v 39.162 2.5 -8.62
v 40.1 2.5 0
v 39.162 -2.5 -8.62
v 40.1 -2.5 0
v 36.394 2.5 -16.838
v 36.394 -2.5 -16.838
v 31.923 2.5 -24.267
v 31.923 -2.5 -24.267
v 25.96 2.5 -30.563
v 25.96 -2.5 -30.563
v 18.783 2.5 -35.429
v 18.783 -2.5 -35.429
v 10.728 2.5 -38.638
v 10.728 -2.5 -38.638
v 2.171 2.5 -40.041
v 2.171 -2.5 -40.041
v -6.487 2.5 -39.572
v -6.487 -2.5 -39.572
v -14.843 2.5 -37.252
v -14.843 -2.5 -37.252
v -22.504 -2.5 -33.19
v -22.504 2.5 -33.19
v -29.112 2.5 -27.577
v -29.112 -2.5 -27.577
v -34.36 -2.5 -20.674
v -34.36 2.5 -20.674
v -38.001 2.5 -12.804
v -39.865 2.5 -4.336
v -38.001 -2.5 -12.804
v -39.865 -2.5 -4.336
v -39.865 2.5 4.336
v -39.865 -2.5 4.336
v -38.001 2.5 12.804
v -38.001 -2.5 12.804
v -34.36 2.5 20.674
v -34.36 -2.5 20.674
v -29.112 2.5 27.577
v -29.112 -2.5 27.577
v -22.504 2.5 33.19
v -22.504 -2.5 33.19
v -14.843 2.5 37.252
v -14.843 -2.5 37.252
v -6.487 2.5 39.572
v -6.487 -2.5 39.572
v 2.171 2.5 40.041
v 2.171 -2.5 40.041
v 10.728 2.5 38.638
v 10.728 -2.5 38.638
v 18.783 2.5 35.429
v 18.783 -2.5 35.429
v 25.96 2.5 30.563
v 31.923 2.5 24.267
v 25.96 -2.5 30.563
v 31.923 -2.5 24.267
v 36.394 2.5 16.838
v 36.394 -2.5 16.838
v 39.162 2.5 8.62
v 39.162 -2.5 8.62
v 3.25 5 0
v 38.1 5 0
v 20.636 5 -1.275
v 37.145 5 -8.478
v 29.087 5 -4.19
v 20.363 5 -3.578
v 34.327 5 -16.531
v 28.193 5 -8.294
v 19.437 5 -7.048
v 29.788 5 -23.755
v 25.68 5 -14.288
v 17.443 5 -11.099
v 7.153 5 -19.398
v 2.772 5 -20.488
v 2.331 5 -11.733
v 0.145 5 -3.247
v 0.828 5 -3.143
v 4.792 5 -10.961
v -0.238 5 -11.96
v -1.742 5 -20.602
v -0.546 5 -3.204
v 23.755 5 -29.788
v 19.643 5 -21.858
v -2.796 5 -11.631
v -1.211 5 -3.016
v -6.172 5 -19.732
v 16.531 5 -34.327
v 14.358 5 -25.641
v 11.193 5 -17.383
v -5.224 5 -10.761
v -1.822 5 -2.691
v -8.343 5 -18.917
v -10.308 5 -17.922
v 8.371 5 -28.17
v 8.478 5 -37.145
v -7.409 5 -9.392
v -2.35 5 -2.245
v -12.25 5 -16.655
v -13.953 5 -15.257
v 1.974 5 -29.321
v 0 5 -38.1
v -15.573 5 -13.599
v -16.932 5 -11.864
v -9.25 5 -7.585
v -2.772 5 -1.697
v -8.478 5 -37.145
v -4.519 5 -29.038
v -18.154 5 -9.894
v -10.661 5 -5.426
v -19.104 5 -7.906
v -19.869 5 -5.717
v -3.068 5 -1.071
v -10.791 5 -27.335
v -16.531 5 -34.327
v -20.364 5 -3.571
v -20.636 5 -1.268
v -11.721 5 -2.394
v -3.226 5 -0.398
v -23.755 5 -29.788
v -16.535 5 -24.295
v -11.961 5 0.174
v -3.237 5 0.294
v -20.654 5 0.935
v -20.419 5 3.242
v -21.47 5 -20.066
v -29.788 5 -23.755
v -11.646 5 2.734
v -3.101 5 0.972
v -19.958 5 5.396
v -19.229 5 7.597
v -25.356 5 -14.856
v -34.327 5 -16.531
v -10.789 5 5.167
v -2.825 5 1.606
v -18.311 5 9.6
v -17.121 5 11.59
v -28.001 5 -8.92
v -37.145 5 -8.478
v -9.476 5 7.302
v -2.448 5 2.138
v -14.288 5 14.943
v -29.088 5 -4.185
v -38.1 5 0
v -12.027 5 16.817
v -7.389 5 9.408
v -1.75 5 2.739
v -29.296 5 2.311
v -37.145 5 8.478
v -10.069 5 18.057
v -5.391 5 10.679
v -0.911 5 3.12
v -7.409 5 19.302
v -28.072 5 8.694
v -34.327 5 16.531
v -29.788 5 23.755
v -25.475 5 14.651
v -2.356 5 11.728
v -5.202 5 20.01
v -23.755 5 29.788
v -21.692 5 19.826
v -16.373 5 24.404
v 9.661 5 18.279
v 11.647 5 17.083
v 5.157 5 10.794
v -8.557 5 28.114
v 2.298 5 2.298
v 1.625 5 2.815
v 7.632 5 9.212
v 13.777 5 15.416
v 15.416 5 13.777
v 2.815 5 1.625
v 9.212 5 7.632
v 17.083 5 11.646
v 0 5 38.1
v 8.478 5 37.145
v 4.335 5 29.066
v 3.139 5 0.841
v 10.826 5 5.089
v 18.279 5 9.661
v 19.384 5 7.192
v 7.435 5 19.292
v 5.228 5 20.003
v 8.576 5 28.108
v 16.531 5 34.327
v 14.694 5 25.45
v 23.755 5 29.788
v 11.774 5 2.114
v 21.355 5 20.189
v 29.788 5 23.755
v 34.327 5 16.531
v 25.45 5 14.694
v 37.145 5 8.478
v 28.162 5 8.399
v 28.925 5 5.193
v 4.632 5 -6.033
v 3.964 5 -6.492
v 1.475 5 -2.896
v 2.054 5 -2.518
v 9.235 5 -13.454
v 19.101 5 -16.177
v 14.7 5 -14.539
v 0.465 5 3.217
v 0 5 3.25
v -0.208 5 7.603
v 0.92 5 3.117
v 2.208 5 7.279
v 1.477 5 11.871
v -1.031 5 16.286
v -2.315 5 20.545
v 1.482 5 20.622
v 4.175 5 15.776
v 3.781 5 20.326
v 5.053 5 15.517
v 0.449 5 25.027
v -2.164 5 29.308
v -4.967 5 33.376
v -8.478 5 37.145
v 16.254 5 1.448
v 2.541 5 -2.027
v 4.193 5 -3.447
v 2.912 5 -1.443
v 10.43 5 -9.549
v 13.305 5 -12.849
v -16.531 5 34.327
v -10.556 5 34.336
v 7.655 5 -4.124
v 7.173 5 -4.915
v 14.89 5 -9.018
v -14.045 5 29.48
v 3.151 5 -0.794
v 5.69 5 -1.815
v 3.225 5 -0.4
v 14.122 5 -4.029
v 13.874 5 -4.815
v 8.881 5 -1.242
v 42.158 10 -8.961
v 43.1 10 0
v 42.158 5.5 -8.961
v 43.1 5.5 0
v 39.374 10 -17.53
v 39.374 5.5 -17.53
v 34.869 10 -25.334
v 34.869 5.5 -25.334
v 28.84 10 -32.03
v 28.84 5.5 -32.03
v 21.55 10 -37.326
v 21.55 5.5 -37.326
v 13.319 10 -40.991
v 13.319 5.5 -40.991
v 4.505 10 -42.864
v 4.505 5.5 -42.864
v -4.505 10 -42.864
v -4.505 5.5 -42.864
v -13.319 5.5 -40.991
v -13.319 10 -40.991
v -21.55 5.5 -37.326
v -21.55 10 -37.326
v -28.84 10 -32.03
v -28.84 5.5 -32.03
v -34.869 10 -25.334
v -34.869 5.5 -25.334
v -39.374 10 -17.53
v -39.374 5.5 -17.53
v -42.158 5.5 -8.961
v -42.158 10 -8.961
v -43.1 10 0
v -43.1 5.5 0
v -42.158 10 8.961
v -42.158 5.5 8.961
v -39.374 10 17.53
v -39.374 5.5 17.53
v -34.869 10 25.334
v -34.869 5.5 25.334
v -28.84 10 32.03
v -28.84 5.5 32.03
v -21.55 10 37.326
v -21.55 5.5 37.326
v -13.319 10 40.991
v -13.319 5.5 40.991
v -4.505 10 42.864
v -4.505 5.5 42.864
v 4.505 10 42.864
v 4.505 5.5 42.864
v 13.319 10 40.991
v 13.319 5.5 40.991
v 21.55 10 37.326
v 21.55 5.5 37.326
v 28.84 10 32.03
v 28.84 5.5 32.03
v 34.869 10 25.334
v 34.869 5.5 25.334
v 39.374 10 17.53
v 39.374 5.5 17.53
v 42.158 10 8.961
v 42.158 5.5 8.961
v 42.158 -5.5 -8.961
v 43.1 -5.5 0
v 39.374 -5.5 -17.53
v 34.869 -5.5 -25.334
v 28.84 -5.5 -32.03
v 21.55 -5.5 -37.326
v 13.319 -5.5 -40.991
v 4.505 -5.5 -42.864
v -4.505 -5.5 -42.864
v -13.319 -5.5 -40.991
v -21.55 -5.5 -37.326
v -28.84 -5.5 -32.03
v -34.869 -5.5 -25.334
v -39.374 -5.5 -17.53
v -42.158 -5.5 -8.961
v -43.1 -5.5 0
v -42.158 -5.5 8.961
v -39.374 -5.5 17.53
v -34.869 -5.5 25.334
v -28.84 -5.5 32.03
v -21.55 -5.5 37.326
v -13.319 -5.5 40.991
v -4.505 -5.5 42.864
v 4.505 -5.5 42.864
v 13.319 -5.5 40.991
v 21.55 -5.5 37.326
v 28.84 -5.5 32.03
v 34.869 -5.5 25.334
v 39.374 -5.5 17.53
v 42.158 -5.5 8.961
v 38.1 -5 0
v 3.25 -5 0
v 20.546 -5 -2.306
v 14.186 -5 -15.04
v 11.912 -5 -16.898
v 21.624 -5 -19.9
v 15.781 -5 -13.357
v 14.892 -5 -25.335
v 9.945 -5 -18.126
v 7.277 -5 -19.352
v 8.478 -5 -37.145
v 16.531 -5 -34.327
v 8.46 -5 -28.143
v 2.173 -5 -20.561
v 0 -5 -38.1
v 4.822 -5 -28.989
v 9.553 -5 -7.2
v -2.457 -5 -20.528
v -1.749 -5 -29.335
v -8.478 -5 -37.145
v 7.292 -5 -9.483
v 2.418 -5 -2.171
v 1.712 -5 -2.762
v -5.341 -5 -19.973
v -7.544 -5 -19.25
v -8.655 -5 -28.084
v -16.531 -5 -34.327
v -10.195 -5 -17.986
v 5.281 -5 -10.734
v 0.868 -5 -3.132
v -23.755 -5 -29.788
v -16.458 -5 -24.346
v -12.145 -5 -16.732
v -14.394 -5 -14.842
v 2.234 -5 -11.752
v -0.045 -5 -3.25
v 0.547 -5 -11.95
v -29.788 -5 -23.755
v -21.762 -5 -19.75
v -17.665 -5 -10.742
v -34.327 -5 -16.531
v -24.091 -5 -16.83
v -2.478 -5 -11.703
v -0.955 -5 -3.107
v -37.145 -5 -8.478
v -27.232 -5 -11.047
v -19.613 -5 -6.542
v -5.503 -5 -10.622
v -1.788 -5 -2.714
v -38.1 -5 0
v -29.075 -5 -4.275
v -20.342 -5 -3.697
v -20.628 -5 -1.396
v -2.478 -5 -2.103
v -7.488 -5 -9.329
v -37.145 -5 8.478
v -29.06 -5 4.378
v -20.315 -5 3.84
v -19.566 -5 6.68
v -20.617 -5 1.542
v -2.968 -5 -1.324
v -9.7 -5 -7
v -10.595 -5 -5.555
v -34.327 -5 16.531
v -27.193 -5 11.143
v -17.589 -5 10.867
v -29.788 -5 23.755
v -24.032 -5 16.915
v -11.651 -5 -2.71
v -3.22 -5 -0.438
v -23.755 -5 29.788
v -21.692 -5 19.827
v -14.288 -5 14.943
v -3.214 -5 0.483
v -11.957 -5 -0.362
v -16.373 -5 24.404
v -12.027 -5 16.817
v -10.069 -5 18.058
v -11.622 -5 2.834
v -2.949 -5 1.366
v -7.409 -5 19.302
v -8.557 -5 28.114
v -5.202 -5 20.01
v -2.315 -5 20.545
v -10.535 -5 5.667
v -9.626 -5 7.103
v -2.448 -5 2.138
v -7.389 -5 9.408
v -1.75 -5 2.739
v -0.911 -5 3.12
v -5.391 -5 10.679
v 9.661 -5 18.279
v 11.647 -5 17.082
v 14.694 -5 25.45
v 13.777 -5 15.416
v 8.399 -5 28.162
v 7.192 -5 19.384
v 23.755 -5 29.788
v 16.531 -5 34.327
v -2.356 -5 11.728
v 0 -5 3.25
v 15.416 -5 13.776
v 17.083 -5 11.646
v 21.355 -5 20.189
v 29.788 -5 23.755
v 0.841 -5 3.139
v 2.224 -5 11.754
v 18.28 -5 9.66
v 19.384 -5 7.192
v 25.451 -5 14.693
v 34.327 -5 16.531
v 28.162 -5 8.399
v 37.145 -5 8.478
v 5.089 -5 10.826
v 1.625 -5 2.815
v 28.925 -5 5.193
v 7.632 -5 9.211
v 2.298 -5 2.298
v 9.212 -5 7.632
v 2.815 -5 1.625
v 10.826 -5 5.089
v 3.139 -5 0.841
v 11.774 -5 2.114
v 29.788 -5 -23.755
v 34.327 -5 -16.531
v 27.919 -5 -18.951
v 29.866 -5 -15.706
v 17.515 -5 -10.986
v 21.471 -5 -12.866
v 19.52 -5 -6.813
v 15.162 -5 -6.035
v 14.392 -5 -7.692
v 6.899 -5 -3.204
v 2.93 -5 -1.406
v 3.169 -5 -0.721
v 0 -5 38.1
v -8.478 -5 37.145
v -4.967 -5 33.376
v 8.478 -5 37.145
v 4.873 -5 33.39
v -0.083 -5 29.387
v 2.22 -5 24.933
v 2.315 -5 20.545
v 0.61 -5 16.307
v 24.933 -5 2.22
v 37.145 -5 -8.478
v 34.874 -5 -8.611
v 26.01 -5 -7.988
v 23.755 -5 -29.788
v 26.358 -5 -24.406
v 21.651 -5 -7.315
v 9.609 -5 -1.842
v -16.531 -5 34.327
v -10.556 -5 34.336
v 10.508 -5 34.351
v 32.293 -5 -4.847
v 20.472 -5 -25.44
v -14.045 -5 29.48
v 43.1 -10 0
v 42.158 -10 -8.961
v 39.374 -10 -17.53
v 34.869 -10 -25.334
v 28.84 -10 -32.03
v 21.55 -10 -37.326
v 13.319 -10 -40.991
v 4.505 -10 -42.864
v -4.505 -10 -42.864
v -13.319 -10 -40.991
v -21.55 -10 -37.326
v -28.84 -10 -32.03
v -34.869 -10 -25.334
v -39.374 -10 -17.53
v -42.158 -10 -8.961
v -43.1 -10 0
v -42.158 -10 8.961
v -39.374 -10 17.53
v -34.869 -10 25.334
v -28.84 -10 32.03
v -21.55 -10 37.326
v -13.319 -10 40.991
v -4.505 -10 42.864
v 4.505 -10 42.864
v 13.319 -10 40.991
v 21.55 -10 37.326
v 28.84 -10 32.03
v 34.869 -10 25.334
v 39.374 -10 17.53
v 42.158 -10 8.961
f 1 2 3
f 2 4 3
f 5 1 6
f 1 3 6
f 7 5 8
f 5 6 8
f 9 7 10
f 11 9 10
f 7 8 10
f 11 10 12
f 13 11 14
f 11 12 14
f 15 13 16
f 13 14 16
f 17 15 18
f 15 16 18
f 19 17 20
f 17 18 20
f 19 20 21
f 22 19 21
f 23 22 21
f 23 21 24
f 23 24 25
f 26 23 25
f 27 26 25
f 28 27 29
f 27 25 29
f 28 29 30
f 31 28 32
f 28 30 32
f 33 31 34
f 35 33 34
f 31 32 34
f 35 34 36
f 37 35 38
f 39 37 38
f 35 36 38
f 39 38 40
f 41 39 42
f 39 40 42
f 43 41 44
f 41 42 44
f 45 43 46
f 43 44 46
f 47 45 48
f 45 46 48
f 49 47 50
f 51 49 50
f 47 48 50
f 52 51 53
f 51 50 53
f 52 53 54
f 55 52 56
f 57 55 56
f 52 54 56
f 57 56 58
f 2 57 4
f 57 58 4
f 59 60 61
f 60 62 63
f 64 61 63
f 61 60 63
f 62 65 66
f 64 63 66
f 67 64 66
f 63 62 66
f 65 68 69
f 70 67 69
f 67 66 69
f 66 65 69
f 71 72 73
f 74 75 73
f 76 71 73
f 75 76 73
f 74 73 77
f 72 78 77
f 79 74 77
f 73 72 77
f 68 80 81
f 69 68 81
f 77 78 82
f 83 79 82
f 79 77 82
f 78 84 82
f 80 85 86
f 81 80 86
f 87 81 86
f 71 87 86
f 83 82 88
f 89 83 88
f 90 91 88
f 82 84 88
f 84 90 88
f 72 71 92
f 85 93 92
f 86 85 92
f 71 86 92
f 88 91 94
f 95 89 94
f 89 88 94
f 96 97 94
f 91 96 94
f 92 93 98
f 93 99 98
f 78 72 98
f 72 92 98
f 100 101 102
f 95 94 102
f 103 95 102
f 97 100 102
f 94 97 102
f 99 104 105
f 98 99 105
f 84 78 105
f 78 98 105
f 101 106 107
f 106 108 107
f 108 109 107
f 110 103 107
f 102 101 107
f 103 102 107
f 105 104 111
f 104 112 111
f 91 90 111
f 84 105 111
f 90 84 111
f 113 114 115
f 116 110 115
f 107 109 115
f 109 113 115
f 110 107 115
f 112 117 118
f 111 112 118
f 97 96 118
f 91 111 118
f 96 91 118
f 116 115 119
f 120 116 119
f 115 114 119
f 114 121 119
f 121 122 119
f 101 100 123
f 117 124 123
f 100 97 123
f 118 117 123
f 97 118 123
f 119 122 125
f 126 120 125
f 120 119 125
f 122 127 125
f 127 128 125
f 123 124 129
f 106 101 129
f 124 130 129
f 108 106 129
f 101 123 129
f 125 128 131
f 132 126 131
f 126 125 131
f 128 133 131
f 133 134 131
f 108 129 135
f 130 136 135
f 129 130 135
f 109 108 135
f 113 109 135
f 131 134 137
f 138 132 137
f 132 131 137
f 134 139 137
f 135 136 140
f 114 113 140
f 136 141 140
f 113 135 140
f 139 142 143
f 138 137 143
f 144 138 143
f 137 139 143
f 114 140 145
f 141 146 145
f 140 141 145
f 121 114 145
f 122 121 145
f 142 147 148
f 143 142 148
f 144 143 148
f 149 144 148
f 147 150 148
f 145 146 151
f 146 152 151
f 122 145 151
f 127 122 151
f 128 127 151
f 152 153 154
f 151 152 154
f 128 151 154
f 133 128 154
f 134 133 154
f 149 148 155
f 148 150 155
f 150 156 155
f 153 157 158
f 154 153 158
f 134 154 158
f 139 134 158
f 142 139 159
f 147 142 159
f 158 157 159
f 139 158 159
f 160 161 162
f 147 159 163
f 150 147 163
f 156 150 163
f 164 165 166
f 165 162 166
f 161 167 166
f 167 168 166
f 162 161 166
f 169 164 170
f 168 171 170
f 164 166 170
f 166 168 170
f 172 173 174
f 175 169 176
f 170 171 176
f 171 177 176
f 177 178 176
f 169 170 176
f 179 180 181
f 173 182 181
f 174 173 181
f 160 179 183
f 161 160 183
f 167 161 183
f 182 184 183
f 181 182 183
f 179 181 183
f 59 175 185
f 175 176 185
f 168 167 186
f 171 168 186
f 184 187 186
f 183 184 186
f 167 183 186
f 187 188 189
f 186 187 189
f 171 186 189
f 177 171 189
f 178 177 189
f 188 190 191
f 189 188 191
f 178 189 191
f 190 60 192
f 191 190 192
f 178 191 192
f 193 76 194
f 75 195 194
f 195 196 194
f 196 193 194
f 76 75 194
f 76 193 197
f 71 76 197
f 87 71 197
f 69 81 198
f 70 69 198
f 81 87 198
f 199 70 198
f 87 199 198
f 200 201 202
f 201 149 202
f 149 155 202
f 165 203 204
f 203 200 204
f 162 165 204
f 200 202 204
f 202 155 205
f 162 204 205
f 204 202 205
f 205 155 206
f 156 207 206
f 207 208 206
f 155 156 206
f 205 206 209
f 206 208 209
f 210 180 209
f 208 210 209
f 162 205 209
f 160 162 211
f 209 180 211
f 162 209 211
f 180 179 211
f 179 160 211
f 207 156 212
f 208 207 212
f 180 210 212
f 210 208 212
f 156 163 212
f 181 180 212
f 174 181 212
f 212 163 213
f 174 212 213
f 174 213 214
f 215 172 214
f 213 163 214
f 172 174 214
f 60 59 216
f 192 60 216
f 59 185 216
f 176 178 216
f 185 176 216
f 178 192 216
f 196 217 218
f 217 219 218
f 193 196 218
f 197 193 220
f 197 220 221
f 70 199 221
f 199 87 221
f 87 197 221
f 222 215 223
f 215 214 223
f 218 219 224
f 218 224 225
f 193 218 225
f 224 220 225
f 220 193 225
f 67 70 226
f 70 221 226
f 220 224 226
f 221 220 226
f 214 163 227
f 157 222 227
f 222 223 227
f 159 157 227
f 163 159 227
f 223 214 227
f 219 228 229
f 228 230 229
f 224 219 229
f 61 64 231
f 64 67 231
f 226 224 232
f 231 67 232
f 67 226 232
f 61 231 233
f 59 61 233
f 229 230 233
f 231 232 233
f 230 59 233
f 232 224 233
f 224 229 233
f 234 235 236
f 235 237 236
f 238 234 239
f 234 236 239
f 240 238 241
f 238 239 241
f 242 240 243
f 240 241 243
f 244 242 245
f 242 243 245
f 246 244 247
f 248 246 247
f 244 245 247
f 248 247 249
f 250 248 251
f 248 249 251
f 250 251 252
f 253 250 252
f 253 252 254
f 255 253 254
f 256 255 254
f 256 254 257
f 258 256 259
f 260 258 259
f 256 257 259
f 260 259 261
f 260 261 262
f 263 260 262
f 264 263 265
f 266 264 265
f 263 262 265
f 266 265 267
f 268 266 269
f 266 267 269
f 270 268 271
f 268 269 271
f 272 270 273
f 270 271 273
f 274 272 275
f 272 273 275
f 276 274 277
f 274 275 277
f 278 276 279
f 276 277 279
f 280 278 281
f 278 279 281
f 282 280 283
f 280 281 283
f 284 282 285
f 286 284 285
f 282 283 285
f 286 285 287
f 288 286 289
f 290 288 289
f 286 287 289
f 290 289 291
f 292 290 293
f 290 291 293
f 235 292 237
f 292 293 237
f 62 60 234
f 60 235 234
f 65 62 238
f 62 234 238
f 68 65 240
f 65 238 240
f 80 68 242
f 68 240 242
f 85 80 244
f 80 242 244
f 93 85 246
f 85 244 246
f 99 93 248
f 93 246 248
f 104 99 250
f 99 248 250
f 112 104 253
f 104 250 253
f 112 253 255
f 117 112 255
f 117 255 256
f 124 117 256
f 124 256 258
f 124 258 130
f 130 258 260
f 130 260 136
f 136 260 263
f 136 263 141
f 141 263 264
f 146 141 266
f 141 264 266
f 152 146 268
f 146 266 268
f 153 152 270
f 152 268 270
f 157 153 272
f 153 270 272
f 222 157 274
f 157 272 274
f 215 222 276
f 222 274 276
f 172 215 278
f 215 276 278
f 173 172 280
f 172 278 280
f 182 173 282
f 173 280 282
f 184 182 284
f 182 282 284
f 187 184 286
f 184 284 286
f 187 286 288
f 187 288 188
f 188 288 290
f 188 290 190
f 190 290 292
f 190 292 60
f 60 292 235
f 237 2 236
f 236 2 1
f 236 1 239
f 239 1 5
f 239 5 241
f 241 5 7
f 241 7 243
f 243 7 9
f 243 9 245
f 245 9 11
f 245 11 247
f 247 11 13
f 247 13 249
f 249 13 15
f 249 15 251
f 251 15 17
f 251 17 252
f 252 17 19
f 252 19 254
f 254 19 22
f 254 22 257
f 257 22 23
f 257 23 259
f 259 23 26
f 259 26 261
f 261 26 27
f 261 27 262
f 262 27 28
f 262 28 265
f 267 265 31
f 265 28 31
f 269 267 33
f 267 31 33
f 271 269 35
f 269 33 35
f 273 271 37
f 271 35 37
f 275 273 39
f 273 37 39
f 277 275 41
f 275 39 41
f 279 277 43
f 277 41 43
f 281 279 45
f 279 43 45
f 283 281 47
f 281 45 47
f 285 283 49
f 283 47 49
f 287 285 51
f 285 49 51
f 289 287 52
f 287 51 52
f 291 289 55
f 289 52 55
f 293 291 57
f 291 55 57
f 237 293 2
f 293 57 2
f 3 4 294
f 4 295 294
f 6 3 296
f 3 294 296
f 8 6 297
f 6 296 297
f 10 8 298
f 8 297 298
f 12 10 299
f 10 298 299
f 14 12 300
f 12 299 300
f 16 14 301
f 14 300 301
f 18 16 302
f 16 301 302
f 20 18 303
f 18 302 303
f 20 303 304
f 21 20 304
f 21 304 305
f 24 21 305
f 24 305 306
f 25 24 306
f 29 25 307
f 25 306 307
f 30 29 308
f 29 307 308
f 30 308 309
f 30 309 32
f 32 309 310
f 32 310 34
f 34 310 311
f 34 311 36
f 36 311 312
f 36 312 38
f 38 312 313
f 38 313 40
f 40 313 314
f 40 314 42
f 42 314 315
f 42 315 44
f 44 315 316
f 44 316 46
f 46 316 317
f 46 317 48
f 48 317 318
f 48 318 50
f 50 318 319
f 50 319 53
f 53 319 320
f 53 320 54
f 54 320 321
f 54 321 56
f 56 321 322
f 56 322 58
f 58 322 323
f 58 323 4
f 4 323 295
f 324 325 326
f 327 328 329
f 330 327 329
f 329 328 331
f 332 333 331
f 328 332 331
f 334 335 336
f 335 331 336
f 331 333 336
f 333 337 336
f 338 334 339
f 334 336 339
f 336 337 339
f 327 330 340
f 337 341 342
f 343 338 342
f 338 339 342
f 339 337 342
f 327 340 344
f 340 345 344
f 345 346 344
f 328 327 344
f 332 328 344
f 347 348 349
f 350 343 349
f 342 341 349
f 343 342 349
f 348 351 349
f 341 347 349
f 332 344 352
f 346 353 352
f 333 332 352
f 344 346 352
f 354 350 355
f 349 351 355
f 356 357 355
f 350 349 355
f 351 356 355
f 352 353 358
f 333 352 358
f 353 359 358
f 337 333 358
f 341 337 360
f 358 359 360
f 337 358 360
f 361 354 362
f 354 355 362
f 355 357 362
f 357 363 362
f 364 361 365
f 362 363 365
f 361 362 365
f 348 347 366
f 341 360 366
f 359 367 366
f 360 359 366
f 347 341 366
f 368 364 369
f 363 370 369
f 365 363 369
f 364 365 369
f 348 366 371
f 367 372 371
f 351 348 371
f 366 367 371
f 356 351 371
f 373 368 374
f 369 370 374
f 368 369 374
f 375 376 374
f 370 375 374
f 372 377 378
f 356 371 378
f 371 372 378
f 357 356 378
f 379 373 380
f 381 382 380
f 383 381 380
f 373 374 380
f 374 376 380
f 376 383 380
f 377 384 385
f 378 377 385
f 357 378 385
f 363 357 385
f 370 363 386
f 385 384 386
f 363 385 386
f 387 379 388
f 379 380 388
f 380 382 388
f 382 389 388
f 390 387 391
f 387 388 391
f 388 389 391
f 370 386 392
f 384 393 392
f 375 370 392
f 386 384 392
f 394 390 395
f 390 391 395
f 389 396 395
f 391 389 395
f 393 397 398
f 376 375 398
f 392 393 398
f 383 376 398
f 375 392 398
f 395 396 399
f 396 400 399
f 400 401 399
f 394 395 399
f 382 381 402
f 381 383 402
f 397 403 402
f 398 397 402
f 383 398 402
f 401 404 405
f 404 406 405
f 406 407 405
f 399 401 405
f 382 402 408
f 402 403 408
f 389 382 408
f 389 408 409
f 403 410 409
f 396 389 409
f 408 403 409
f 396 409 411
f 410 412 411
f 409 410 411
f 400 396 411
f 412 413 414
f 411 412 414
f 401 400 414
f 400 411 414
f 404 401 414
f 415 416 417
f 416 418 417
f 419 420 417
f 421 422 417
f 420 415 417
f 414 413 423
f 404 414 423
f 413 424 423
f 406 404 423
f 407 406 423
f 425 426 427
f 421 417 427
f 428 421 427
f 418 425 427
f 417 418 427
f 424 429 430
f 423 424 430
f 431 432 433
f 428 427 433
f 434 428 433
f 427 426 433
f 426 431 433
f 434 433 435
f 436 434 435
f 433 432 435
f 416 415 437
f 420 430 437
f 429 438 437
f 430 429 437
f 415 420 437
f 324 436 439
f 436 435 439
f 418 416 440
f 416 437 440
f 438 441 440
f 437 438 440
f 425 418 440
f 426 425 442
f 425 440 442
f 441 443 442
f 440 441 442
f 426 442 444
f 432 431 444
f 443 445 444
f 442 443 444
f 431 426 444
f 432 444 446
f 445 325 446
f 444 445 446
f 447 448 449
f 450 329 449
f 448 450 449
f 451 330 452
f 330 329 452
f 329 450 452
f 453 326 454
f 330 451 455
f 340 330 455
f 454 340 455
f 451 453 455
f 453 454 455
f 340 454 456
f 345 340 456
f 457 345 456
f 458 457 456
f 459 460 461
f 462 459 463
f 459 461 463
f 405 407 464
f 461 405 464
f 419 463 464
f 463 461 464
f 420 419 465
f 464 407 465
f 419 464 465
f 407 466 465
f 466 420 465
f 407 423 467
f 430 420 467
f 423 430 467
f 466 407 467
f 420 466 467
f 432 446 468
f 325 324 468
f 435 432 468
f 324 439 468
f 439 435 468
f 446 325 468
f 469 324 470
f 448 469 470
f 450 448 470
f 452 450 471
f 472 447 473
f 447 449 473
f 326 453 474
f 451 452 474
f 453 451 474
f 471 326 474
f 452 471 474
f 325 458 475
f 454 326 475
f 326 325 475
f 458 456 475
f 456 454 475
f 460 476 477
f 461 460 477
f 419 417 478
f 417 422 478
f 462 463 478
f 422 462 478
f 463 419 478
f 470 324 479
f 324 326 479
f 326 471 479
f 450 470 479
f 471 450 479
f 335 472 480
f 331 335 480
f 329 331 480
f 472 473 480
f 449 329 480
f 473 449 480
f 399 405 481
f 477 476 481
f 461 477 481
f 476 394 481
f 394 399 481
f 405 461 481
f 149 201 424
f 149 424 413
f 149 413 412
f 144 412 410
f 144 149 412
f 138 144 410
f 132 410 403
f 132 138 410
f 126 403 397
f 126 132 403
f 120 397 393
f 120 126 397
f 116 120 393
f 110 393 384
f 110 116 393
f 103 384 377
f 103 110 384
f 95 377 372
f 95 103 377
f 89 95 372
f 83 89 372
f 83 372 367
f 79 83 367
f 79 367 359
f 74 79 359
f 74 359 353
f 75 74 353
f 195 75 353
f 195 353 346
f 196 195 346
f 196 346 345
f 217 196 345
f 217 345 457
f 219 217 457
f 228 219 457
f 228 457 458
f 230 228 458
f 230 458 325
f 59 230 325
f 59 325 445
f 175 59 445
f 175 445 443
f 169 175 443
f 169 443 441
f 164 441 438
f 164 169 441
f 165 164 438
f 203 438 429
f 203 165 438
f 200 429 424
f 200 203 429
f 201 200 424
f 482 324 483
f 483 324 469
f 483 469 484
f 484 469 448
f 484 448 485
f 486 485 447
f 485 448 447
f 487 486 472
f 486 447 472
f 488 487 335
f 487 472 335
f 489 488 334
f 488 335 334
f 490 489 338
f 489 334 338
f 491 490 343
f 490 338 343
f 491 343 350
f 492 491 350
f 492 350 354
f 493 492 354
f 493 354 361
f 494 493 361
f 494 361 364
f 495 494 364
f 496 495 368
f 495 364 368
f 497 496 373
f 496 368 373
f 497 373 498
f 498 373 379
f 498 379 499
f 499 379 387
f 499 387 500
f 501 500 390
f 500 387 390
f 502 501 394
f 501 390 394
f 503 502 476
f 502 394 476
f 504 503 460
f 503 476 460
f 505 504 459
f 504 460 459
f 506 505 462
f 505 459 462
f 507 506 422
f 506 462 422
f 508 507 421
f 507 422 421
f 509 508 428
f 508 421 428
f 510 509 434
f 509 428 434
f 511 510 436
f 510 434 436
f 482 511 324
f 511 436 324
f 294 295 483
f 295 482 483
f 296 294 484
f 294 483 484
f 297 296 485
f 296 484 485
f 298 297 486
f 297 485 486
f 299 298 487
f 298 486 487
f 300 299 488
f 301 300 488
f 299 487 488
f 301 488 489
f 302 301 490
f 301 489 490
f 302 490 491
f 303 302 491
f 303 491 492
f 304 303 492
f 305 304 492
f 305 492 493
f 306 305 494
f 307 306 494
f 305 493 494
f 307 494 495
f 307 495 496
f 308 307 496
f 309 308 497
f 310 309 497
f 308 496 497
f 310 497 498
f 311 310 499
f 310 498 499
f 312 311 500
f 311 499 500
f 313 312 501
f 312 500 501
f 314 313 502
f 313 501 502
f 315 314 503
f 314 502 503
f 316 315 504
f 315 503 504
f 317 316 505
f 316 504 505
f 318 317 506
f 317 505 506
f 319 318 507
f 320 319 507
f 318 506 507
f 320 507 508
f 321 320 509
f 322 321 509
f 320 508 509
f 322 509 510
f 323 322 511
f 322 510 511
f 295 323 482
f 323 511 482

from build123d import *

# Parameters (mm, degrees)
CUT_EXTRUDE1_DEPTH      = 63.771171727
CUT_EXTRUDE1_DEPTH_BACK = 63.771171727
SKETCH6_R               = 3.25


with BuildPart() as part:
    # Sweep1: sweep along a path in Sketch1
    with BuildLine(Plane(origin=(0, 0, 0), x_dir=(1, 0, 0), z_dir=(0, 1, 0))) as sweep1_path:
        CenterArc((0, 0), 38.1, 0, 360)
    # Sketch2 → Sweep1 (sweep)
    with BuildSketch(Plane(origin=(0, 0, 0), x_dir=(0, 0, -1), z_dir=(1, 0, 0))):
        Polygon((-38.1, 5), (-43.1, 10), (-43.1, 5.5), (-40.1, 2.5), (-40.1, -2.5), (-43.1, -5.5), (-43.1, -10), (-38.1, -5), (0, -5), (0, 0), (0, 5), align=None)
    sweep(path=sweep1_path.line)

    # Sketch6 → Cut-Extrude1 (cut, two sides: drawn at the far end of the back side and taken through both)
    with BuildSketch(Plane(origin=(0, -5, 0), x_dir=(-1, 0, 0), z_dir=(0, -1, 0)).offset(-CUT_EXTRUDE1_DEPTH_BACK)):
        with Locations(Location((0, 0, 0), (0, 0, 270))):
            Circle(SKETCH6_R)
    extrude(amount=CUT_EXTRUDE1_DEPTH + CUT_EXTRUDE1_DEPTH_BACK, mode=Mode.SUBTRACT)


solid = part.part
